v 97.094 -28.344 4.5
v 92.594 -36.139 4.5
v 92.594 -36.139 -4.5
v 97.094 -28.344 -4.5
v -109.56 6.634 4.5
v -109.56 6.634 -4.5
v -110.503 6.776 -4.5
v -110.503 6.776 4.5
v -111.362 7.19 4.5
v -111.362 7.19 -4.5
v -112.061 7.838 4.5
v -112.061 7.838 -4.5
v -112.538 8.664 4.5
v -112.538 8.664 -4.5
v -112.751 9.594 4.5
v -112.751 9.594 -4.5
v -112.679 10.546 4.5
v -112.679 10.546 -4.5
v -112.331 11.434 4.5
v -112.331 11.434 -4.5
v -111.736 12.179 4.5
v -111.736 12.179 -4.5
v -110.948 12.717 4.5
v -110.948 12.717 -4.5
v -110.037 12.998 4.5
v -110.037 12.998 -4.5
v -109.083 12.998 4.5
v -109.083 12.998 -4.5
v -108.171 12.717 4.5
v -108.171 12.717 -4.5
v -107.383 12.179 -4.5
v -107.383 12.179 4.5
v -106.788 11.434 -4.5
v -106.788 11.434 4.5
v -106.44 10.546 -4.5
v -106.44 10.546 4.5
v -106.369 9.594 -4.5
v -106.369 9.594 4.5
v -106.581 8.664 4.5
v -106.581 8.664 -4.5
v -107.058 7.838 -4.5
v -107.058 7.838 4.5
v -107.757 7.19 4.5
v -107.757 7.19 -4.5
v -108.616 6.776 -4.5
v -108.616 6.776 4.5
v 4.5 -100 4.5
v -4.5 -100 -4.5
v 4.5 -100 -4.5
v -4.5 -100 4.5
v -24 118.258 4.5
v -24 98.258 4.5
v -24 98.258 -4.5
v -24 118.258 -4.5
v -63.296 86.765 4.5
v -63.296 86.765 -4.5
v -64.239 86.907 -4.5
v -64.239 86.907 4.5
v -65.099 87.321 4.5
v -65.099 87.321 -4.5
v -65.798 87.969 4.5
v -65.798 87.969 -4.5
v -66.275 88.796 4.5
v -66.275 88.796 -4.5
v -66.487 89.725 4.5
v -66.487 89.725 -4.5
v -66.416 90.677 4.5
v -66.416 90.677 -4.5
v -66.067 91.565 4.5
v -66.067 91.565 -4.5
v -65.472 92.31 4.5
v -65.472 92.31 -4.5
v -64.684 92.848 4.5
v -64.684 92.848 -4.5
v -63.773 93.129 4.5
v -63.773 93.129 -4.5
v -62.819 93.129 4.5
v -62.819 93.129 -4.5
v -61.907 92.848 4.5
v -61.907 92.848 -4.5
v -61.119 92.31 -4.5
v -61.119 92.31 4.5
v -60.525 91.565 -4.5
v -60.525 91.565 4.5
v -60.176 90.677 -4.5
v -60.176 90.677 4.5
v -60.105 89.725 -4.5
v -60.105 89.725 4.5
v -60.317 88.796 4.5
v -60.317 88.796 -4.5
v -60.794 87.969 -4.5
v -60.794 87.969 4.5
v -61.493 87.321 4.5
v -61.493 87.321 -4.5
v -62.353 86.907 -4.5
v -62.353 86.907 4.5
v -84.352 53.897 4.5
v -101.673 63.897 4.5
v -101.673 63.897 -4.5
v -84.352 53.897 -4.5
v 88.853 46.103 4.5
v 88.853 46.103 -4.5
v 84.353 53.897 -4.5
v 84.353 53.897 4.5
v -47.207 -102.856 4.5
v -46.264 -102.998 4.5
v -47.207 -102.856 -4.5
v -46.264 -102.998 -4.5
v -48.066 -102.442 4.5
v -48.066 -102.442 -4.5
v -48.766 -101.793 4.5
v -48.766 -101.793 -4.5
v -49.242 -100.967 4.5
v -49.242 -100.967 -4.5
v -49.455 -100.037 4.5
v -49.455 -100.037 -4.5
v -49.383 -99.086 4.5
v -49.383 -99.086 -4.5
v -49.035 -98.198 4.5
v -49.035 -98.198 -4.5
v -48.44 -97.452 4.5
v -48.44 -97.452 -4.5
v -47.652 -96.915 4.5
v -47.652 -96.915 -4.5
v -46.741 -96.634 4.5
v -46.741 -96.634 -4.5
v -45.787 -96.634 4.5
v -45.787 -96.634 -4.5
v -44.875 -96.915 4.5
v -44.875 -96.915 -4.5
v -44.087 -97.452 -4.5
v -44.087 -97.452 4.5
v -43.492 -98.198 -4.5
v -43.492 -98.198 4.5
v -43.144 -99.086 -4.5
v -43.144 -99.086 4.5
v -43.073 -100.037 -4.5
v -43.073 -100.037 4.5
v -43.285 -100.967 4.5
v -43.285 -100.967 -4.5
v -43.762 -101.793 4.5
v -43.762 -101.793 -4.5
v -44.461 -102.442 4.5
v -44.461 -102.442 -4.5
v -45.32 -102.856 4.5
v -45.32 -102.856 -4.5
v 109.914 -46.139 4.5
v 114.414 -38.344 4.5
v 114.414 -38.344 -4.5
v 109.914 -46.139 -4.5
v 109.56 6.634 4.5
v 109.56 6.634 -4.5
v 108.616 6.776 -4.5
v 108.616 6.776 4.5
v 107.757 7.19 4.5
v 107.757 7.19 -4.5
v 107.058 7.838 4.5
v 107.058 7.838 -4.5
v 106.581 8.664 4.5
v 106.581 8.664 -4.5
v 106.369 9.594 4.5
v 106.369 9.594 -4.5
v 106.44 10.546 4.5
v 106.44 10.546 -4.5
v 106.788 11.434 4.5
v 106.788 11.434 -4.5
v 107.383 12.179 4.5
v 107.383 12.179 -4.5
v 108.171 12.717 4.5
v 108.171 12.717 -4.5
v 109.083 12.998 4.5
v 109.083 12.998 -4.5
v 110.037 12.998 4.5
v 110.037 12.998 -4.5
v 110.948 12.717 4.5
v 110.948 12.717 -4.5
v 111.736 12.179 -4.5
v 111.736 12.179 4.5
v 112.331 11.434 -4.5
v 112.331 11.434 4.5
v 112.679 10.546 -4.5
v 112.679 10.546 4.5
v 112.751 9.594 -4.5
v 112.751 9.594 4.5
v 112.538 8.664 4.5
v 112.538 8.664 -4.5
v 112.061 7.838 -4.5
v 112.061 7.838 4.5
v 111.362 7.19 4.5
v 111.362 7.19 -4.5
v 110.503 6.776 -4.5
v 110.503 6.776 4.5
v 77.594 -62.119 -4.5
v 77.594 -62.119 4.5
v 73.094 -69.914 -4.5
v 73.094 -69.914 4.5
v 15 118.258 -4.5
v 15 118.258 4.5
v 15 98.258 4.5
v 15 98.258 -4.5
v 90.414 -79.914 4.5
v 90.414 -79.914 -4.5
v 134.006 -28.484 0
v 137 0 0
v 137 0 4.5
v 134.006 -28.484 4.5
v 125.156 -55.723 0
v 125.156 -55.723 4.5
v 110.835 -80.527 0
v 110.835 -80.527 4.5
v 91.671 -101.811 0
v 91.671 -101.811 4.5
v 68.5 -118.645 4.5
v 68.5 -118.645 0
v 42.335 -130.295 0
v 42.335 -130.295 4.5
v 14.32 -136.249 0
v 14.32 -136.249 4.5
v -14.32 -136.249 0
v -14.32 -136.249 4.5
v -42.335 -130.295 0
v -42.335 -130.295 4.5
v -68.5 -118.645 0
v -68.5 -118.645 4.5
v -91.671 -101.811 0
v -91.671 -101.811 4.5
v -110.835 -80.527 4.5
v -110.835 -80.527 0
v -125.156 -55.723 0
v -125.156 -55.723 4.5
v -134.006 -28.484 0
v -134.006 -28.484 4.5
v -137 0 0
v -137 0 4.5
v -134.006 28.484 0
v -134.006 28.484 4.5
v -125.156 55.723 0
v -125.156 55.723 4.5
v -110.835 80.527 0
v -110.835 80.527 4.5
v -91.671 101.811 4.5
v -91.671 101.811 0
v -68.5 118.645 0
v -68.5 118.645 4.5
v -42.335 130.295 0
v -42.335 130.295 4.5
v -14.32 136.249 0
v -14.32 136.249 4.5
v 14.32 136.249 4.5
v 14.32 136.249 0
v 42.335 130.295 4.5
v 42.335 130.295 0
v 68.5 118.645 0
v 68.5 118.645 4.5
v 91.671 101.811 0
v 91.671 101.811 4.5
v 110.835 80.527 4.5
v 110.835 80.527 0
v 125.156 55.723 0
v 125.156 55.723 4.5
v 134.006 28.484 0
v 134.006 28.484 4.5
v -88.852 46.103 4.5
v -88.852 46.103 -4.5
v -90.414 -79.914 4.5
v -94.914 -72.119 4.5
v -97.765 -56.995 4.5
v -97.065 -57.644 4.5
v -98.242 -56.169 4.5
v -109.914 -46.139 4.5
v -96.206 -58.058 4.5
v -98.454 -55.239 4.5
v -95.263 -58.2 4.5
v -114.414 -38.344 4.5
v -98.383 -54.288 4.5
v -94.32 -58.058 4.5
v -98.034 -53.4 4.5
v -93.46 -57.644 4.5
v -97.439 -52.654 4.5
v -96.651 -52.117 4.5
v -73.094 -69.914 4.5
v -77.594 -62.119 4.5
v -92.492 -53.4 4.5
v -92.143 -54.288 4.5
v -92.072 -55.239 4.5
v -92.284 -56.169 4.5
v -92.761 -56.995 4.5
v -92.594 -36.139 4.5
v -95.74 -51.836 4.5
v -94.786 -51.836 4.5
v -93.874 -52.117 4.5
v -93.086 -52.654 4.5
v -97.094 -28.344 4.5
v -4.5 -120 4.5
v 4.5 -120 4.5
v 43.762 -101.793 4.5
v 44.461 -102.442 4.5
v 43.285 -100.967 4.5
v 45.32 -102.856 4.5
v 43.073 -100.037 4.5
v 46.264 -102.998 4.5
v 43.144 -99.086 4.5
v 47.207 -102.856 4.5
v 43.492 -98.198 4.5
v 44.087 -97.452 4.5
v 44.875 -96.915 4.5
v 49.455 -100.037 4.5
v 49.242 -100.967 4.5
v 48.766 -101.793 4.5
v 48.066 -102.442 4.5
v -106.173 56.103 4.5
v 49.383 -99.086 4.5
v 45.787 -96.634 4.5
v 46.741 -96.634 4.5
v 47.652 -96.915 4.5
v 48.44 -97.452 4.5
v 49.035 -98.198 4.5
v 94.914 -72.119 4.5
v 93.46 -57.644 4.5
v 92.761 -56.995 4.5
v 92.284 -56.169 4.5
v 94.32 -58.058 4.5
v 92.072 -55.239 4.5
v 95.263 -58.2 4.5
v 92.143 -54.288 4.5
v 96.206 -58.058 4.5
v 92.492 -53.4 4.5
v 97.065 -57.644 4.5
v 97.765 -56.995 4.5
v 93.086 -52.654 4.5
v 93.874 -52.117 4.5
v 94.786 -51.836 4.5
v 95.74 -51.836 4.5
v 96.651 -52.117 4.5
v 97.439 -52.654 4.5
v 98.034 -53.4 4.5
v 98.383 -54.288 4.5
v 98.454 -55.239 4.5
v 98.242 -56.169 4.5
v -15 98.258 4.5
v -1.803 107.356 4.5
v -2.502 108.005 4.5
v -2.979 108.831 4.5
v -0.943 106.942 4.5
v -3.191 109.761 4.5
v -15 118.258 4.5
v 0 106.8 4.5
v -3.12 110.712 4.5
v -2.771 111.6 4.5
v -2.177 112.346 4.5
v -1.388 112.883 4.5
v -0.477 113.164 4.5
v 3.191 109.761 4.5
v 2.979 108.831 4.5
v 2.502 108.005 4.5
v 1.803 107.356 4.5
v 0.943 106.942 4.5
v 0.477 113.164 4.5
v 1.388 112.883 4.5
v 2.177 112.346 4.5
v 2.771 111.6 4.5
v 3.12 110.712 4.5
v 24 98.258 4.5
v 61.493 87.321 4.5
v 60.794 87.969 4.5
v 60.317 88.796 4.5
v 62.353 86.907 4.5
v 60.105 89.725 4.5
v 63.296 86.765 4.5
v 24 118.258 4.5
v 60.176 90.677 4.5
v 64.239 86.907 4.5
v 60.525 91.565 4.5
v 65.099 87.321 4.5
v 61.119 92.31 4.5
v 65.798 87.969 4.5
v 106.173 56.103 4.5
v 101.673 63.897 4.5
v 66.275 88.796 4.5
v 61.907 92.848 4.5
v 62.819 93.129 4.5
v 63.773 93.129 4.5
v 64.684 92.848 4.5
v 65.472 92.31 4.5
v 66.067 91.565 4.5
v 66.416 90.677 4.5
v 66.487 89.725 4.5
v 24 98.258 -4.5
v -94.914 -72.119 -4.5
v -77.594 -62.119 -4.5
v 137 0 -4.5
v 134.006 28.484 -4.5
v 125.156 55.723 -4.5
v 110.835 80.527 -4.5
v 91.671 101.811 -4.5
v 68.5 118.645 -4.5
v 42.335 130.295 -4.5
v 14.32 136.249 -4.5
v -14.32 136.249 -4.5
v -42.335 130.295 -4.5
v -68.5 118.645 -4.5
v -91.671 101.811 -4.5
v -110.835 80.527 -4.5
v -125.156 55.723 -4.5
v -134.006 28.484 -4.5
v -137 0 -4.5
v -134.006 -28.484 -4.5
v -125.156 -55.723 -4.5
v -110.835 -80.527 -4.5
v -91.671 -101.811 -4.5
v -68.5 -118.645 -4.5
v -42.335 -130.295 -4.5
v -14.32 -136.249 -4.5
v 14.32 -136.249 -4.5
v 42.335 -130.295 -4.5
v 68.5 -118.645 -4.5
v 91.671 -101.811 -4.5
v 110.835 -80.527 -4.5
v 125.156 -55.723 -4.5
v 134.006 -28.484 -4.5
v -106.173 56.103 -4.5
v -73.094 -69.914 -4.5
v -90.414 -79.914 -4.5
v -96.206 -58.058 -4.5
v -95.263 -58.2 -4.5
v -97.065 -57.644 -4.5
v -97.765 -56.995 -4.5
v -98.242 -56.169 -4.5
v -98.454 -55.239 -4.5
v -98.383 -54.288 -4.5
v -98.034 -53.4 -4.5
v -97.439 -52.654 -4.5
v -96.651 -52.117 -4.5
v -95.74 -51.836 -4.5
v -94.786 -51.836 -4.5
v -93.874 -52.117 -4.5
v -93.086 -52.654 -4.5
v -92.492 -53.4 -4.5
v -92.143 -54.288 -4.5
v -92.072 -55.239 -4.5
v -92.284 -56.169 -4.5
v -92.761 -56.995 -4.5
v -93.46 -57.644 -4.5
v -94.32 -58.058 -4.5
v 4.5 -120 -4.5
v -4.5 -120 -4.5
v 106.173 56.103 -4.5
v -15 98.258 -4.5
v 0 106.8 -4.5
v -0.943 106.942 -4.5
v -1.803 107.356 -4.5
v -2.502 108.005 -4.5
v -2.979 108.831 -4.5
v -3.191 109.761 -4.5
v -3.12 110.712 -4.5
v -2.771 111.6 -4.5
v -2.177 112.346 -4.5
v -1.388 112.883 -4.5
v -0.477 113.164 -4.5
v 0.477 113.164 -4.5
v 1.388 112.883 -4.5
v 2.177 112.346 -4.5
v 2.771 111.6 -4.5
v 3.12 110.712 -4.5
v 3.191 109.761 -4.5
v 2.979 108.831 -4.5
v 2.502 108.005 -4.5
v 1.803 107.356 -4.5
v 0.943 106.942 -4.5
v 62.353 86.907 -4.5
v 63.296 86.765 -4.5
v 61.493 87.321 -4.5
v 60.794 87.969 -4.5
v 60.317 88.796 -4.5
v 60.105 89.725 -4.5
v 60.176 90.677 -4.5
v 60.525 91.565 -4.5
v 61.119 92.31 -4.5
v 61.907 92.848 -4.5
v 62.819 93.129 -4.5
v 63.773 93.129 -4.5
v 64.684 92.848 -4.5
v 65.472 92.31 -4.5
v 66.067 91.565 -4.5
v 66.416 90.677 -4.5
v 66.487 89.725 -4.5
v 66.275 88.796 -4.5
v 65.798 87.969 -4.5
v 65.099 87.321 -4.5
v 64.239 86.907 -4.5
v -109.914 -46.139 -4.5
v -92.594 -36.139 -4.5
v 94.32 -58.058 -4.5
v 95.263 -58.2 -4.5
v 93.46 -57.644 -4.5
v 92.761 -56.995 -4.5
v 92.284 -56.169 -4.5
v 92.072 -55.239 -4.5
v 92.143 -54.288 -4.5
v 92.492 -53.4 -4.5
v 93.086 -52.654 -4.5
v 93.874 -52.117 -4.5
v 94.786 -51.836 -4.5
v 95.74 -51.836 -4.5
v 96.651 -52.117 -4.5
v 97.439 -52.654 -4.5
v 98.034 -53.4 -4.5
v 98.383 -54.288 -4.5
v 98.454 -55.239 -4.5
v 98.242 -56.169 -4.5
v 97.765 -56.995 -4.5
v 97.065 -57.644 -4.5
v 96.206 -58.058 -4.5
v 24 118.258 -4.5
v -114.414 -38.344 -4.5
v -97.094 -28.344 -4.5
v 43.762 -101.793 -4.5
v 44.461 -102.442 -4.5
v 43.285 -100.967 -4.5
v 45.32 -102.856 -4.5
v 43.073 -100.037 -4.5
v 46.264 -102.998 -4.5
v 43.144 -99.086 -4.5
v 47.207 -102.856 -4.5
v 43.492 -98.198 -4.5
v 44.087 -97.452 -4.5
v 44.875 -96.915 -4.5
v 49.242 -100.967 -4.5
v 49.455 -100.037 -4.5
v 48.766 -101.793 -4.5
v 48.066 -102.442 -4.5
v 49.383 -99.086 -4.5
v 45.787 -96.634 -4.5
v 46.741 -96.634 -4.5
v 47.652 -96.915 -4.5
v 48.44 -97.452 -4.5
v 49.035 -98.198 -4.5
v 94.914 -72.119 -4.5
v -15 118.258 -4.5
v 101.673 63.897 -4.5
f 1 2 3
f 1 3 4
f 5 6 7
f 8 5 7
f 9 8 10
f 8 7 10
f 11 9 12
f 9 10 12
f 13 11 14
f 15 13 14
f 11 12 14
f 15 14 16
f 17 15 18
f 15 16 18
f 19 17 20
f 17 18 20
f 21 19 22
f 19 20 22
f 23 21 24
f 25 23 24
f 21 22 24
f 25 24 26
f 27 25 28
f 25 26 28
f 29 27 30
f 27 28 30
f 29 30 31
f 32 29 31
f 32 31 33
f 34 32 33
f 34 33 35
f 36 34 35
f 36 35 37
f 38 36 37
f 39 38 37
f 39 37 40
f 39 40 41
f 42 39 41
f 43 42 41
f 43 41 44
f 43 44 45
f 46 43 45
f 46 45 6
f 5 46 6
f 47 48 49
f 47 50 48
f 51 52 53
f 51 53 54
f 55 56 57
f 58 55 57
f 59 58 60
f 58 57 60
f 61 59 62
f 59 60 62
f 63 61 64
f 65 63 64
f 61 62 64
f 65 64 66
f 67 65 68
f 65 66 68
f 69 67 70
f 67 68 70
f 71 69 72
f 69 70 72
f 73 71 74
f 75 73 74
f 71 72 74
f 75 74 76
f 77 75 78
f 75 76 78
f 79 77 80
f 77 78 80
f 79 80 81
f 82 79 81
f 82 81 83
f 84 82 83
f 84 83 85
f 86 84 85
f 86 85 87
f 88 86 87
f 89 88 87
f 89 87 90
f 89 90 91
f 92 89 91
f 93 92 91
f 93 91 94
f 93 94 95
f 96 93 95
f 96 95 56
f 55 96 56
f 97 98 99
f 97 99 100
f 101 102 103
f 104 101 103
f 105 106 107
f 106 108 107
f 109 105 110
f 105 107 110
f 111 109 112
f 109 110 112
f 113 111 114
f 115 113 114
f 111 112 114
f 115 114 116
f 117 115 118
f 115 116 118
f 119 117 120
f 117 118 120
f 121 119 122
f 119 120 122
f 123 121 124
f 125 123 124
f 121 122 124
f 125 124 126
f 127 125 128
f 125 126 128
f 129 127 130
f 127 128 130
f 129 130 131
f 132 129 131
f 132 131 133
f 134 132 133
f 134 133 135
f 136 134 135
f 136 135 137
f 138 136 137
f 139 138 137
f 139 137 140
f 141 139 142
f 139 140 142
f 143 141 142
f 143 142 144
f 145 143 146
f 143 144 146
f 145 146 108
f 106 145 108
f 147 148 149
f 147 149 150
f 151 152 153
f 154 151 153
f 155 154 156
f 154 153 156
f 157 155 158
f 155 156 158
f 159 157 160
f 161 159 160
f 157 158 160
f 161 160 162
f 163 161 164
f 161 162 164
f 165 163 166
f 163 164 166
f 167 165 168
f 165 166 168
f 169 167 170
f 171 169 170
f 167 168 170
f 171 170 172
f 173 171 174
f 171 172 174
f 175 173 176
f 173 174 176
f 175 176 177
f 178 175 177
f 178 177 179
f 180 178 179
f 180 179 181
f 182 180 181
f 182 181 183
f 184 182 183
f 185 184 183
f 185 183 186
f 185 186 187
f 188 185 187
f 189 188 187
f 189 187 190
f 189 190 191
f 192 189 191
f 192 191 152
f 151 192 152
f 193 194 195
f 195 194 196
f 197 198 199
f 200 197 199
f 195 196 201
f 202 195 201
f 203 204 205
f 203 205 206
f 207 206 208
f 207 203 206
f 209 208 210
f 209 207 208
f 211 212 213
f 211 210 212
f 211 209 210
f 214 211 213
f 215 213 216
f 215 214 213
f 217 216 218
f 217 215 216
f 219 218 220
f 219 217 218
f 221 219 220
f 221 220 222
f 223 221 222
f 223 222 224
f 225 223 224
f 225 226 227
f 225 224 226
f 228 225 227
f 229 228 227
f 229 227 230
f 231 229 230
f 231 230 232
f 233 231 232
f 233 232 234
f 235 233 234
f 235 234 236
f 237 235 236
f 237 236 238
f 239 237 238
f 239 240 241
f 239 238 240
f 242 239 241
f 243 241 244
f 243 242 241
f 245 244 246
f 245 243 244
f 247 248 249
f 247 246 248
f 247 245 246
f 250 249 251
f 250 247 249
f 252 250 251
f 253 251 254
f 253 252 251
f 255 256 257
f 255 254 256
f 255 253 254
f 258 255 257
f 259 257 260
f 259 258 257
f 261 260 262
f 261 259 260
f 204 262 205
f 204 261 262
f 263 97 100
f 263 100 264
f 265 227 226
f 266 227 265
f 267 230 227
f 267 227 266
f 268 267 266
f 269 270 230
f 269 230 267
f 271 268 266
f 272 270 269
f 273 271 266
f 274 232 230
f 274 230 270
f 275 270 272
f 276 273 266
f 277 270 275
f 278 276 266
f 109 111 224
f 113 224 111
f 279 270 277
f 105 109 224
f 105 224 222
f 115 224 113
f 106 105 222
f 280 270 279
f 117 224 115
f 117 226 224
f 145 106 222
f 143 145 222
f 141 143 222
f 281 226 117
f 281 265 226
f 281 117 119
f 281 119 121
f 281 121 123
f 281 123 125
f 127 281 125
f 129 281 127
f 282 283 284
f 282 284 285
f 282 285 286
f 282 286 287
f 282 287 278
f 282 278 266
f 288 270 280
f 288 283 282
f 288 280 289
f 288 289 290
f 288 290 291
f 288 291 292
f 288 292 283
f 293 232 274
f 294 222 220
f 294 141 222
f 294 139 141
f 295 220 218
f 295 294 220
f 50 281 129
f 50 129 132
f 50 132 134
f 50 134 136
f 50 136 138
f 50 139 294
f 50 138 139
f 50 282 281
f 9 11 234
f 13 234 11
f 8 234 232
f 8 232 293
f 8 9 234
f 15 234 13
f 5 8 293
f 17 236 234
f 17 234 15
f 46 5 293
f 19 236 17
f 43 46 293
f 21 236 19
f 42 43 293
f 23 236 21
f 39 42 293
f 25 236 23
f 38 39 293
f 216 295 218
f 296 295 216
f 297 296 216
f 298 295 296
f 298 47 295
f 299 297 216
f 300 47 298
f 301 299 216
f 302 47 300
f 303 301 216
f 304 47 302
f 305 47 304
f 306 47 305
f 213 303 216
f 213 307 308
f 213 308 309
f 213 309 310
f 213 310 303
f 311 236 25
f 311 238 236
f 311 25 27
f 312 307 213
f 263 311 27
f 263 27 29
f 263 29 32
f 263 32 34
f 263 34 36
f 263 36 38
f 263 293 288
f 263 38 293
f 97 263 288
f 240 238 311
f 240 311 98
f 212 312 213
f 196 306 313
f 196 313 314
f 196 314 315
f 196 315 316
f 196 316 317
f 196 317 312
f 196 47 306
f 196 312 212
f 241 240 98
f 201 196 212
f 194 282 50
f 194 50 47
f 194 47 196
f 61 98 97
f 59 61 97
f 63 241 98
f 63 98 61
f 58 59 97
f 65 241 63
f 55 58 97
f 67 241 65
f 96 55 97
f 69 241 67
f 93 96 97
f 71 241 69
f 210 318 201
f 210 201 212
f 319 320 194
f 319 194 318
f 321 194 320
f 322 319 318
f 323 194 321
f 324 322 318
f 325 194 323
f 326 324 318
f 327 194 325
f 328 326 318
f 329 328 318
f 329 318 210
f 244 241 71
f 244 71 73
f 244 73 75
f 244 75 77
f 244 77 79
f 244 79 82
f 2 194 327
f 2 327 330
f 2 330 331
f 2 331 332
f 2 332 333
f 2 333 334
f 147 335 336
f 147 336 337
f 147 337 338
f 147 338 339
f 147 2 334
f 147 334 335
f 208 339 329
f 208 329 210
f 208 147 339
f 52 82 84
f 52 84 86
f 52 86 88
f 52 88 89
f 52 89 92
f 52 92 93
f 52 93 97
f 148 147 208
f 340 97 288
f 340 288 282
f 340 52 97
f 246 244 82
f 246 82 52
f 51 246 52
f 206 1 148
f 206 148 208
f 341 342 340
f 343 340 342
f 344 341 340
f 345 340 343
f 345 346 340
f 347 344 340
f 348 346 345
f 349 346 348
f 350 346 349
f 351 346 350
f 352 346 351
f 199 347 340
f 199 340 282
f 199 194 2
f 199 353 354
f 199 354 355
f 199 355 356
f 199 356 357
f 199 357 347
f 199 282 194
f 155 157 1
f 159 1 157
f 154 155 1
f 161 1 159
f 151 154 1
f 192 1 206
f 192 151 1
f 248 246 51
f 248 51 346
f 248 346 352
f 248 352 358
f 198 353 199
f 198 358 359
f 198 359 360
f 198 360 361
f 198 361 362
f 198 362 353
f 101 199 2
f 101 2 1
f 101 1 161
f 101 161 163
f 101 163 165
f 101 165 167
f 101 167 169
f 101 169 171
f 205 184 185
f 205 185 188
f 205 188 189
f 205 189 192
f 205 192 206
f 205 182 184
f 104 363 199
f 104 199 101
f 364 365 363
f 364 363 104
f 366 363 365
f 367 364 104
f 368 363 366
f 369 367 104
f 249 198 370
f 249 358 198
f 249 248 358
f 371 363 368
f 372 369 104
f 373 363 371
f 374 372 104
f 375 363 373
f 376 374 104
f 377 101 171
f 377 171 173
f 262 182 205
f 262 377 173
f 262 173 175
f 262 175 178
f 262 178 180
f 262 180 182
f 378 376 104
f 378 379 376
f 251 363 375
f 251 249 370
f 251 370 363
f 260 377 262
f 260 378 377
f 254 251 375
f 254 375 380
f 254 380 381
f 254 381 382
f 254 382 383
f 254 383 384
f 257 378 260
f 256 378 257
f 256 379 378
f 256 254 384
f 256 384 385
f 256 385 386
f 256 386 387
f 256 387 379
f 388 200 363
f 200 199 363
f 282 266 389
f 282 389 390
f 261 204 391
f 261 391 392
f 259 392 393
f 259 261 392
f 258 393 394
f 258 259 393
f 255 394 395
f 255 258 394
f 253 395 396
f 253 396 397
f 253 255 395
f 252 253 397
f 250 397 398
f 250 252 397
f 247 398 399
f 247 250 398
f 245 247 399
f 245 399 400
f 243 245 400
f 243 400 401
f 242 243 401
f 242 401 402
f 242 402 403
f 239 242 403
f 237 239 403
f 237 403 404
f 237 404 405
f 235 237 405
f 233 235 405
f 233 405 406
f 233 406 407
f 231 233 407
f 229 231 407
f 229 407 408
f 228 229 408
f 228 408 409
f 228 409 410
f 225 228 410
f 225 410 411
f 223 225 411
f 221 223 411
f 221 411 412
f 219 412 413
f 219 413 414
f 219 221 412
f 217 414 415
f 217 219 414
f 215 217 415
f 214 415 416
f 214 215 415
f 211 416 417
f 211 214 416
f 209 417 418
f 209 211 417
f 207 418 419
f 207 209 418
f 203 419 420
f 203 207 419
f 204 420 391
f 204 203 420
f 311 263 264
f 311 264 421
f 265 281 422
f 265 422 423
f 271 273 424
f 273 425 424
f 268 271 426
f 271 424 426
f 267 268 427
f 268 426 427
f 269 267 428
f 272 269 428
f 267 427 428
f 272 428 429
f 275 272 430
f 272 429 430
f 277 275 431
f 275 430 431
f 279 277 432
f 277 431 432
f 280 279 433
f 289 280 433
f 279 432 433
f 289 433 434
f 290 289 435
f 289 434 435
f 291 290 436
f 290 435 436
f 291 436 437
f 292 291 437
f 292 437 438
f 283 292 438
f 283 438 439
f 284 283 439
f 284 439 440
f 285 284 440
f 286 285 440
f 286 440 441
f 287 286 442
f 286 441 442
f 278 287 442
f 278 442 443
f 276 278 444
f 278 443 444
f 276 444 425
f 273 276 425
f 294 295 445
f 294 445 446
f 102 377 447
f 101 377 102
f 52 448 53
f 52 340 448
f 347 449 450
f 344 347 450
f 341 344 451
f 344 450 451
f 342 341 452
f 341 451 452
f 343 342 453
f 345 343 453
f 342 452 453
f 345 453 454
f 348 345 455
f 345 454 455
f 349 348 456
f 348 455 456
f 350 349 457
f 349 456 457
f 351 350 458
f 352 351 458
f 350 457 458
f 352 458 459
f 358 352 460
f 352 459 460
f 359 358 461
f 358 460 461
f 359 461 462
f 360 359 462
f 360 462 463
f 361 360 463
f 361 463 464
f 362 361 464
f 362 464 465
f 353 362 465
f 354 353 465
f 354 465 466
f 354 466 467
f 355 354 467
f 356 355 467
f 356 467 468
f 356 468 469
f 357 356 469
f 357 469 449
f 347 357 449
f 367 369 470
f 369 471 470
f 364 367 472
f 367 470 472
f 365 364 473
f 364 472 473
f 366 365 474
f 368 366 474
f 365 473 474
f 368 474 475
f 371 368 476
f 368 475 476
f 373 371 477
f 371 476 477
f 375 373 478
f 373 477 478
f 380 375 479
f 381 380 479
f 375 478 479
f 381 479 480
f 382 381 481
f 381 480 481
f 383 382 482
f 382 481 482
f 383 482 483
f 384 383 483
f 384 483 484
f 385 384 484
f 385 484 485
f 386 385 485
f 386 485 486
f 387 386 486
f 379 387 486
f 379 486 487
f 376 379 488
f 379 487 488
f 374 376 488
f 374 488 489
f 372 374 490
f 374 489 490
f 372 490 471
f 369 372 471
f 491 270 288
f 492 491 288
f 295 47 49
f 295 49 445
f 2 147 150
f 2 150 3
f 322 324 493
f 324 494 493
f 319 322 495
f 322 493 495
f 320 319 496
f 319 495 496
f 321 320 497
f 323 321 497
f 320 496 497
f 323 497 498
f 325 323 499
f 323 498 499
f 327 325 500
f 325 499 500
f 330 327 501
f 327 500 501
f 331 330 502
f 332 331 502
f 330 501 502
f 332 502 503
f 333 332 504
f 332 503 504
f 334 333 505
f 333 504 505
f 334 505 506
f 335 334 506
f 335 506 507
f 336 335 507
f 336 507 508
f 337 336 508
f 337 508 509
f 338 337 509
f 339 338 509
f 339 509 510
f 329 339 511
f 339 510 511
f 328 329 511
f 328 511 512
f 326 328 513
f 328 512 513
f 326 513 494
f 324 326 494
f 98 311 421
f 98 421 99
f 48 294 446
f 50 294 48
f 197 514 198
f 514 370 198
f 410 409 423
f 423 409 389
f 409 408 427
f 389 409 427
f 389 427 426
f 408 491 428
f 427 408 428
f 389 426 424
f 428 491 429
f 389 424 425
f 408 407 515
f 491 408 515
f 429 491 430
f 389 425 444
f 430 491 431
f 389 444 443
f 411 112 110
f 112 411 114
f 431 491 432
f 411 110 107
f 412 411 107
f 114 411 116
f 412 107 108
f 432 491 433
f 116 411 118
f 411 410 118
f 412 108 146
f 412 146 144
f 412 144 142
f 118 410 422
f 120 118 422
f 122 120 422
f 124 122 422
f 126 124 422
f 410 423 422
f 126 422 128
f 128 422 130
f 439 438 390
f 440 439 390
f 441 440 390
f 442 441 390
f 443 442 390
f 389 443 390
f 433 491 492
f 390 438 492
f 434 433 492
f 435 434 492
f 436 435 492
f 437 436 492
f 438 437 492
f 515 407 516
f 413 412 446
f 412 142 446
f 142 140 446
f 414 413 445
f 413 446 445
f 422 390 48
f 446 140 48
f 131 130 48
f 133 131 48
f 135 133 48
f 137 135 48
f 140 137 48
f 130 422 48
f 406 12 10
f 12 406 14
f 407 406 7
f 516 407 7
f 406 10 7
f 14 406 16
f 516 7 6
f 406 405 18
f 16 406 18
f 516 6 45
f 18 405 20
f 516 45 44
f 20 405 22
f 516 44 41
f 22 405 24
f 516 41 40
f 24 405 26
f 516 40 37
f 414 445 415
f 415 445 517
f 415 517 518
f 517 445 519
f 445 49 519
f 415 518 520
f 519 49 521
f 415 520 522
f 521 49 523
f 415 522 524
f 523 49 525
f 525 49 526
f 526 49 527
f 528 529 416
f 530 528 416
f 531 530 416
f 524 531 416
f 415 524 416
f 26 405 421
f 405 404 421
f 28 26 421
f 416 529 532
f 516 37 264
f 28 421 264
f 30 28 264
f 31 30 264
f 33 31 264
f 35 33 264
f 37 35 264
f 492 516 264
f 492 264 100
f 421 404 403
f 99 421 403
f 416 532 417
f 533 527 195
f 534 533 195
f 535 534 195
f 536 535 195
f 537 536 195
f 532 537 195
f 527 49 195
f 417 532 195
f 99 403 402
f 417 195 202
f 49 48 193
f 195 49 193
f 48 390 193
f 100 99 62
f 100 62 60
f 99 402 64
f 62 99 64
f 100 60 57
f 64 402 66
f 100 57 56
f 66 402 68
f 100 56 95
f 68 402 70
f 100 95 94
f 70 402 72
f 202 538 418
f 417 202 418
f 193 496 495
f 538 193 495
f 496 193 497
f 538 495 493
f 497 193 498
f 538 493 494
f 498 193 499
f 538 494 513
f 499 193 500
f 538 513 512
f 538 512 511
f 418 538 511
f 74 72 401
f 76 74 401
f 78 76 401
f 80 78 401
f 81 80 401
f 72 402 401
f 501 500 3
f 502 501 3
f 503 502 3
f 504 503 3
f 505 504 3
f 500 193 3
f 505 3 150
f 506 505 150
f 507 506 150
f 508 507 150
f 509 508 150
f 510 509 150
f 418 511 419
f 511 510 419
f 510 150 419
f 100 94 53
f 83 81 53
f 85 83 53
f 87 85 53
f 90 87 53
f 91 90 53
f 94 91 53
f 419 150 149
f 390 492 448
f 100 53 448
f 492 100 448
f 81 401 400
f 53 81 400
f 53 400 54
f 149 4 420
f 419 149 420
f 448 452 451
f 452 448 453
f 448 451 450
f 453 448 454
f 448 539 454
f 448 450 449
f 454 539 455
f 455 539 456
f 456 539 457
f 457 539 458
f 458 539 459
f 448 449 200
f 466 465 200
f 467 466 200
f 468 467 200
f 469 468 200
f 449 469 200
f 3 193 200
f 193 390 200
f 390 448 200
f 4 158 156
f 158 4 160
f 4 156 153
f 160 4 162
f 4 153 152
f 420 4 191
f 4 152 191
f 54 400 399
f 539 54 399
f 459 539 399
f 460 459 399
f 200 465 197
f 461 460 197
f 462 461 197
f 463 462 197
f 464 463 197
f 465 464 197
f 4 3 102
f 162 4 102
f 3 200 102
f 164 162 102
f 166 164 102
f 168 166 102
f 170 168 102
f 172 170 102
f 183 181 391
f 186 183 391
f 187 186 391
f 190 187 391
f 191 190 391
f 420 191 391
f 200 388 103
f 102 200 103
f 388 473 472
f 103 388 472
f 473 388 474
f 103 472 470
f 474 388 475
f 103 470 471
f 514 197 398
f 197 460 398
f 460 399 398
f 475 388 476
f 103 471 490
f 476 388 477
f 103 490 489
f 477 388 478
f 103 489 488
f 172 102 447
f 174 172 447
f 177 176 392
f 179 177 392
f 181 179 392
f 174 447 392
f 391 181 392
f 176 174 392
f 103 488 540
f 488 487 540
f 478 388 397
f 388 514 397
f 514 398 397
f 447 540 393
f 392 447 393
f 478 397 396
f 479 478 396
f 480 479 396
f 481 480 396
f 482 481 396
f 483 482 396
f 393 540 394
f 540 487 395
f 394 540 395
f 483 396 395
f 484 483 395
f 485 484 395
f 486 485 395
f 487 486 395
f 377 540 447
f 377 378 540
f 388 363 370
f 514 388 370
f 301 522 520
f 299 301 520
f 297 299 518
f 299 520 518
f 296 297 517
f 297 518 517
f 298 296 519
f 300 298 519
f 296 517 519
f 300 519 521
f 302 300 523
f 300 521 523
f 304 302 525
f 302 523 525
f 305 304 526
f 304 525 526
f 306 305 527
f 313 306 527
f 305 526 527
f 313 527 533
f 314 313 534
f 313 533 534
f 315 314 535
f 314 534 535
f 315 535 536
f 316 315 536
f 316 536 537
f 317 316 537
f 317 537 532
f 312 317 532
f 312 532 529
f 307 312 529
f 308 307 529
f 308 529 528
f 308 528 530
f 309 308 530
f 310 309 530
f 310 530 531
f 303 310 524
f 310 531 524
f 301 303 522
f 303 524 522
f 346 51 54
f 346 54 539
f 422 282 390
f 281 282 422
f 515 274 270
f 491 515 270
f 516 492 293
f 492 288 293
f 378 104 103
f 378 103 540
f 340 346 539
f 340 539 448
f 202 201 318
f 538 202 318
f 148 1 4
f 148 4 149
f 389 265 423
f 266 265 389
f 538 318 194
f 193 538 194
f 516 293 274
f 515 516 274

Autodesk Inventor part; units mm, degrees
ref_plane "YZ Plane" through (0, 0, 0) normal (1, 0, 0) x (0, 1, 0)
ref_plane "XZ Plane" through (0, 0, 0) normal (0, 1, 0) x (-1, 0, 0)
ref_plane "XY Plane" through (0, 0, 0) normal (0, 0, 1) x (1, 0, 0)
sketch "Sketch the Prototype Plate Base Profile" plane through (0, 0, 0) normal (0, 0, 1) x (1, 0, 0)
  circle A0 centre (0, 0) radius 137
  dimension "d0" = 274
extrude "Make Prototype Plate Base by Extrusion" add sketch "Sketch the Prototype Plate Base Profile" along normal mid plane 9
sketch "Locate the Outer Rib Slots" plane through (0, 0, 4.5) normal (0, 0, 1) x (1, 0, 0)
  circle A0 centre (0, 0) radius 137 projected
  line L0 (0, 0) -> (0, 137) construction
  circle A1 centre (0, 137) radius 15 construction
  line L1 (-24, 118.2578) -> (-15, 118.2578)
  line L2 (-15, 118.2578) -> (-15, 98.2578)
  line L3 (-15, 98.2578) -> (-24, 98.2578)
  line L4 (-24, 98.2578) -> (-24, 118.2578)
  line L5 (-24, 118.2578) -> (-15, 98.2578) construction
  line L6 (-15, 118.2578) -> (-24, 98.2578) construction
  line L7 (-19.5, 108.2578) -> (-15, 108.2578) construction
  circle A2 centre (0, 0) radius 61 construction
  line L8 (24, 118.2578) -> (15, 118.2578)
  line L9 (15, 118.2578) -> (15, 98.2578)
  line L10 (15, 98.2578) -> (24, 98.2578)
  line L11 (24, 98.2578) -> (24, 118.2578)
  circle A3 centre (0, 0) radius 110 construction
  line L12 (-15, 98.2578) -> (0, 98.2578) construction
  dimension "d29" = 220
  dimension "d3" = 30
  dimension "d5" = 20
  dimension "d15" = 9
  dimension "d17" = 122
  dimension "d30" = 15
extrude "Cut Outer Rib Slots" cut sketch "Locate the Outer Rib Slots" against normal blind 9 contours L1 L2 L3 L4 | L11 L10 L9 L8
pattern_circular "Pattern Outer Rib Slots Around the Base Plate" count 3 over 360 about axis through (0, 0, -10) along (0, 0, 1) of "Cut Outer Rib Slots"
sketch "Locate the Inner Rib Slot" plane through (0, 0, 4.5) normal (0, 0, 1) x (1, 0, 0)
  circle A0 centre (0, 0) radius 137 projected
  line L0 (-106.173, 56.1029) -> (-101.673, 63.8971)
  line L1 (-101.673, 63.8971) -> (-84.3525, 53.8971)
  line L2 (-84.3525, 53.8971) -> (-88.8525, 46.1029)
  line L3 (-88.8525, 46.1029) -> (-106.173, 56.1029)
  line L4 (-106.173, 56.1029) -> (-84.3525, 53.8971) construction
  line L5 (-101.673, 63.8971) -> (-88.8525, 46.1029) construction
  circle A1 centre (0, 0) radius 110 construction
  line L6 (-95.2628, 55) -> (0, 0) construction
  line L7 (0, -210.7) -> (0, 210.7) projected
  dimension "d31" = 220
  dimension "d27" = 9
  dimension "d28" = 20
  dimension "d32" = 60
extrude "Cut Inner Rib Slots" cut sketch "Locate the Inner Rib Slot" against normal blind 9 contours L0 L1 L2 L3
pattern_circular "Pattern Inner Rib Slots Around the Base Plate" count 3 over 360 about axis through (0, 0, -10) along (0, 0, 1) of "Cut Inner Rib Slots"
sketch "Locate Holes for Connecting Two Bases" plane through (0, 0, 4.5) normal (0, 0, 1) x (1, 0, 0)
  circle A0 centre (0, 0) radius 137 projected
  line L0 (-15, 118.2578) -> (-15, 98.2578) projected
  line L1 (15, 98.2578) -> (15, 118.2578) projected
  circle A1 centre (0, 0) radius 110 construction
  line L2 (0, 0) -> (0, 110) construction
  line L3 (-24, 98.2578) -> (-24, 118.2578) projected
  line L4 (-101.673, 63.8971) -> (-84.3525, 53.8971) projected
  circle A2 centre (-92.933, 58.8511) radius 42.9699 construction
  circle A3 centre (-24, 107.3499) radius 42.9699 construction
  line L5 (24, 118.2578) -> (24, 98.2578) projected
  line L6 (84.3525, 53.8971) -> (101.673, 63.8971) projected
  circle A4 centre (24, 107.3499) radius 42.9699 construction
  circle A5 centre (92.933, 58.8511) radius 42.9699 construction
  point P0 (-63.2959, 89.9646)
  point P1 (63.2959, 89.9646)
  point P2 (-46.2637, -99.7981)
  point P3 (-109.5596, 9.8335)
  point P4 (109.5596, 9.8335)
  point P5 (46.2637, -99.7981)
  dimension "d54" = 220
  dimension "d66" = 360
hole "Clearance Holes to Bolt the Two Bases Together" at (-63.2959, 89.9646, 4.5) at (63.2959, 89.9646, 4.5) at (-46.2637, -99.7981, 4.5) at (-109.5596, 9.8335, 4.5) at (109.5596, 9.8335, 4.5) at (46.2637, -99.7981, 4.5) direction (0, 0, -1) diameter 6.4 end through all clearance for "Socket Head Cap Screw ISO 4762" size "M6" standard "ISO"
hole "Clearance Holes to Bolt the Two Bases Together at Arms" at (0, 110, 4.5) at (-95.2628, -55, 4.5) at (95.2628, -55, 4.5) direction (0, 0, -1) diameter 6.4 end through all clearance for "Socket Head Cap Screw ISO 4762" size "M6" standard "ISO"
equation "\"d0\" = PrototypePlateDiameter"
equation "\"d1\" = PrototypePlateMaterialThickness"
equation "\"d29\" = OuterRibSlotPCD"
equation "\"d3\" = RigColumnsDiameter"
equation "\"d5\" = RibSlotLength"
equation "\"d15\" = PrototypePlateRibMaterialThickness"
equation "\"d30\" = 0.5 * RigColumnsDiameter"
equation "\"d18\" = PrototypePlateMaterialThickness"
equation "\"d31\" = InnerRibSlotPCD"
equation "\"d27\" = PrototypePlateRibMaterialThickness"
equation "\"d28\" = RibSlotLength"
equation "\"d33\" = PrototypePlateMaterialThickness"
equation "\"d54\" = InnerRibSlotPCD"
equation "\"d75\" = InnerRibSlotPCD"
equation "\"PrototypePlateDiameter\" = 274"
equation "\"PrototypePlateMaterialThickness\" = 9"
equation "\"OuterRibSlotPCD\" = 220"
equation "\"RigColumnsDiameter\" = 30"
equation "\"RibSlotLength\" = 20"
equation "\"PrototypePlateRibMaterialThickness\" = 9"
equation "\"InnerRibSlotPCD\" = 220"
properties part number "Prototype Plate Base"
